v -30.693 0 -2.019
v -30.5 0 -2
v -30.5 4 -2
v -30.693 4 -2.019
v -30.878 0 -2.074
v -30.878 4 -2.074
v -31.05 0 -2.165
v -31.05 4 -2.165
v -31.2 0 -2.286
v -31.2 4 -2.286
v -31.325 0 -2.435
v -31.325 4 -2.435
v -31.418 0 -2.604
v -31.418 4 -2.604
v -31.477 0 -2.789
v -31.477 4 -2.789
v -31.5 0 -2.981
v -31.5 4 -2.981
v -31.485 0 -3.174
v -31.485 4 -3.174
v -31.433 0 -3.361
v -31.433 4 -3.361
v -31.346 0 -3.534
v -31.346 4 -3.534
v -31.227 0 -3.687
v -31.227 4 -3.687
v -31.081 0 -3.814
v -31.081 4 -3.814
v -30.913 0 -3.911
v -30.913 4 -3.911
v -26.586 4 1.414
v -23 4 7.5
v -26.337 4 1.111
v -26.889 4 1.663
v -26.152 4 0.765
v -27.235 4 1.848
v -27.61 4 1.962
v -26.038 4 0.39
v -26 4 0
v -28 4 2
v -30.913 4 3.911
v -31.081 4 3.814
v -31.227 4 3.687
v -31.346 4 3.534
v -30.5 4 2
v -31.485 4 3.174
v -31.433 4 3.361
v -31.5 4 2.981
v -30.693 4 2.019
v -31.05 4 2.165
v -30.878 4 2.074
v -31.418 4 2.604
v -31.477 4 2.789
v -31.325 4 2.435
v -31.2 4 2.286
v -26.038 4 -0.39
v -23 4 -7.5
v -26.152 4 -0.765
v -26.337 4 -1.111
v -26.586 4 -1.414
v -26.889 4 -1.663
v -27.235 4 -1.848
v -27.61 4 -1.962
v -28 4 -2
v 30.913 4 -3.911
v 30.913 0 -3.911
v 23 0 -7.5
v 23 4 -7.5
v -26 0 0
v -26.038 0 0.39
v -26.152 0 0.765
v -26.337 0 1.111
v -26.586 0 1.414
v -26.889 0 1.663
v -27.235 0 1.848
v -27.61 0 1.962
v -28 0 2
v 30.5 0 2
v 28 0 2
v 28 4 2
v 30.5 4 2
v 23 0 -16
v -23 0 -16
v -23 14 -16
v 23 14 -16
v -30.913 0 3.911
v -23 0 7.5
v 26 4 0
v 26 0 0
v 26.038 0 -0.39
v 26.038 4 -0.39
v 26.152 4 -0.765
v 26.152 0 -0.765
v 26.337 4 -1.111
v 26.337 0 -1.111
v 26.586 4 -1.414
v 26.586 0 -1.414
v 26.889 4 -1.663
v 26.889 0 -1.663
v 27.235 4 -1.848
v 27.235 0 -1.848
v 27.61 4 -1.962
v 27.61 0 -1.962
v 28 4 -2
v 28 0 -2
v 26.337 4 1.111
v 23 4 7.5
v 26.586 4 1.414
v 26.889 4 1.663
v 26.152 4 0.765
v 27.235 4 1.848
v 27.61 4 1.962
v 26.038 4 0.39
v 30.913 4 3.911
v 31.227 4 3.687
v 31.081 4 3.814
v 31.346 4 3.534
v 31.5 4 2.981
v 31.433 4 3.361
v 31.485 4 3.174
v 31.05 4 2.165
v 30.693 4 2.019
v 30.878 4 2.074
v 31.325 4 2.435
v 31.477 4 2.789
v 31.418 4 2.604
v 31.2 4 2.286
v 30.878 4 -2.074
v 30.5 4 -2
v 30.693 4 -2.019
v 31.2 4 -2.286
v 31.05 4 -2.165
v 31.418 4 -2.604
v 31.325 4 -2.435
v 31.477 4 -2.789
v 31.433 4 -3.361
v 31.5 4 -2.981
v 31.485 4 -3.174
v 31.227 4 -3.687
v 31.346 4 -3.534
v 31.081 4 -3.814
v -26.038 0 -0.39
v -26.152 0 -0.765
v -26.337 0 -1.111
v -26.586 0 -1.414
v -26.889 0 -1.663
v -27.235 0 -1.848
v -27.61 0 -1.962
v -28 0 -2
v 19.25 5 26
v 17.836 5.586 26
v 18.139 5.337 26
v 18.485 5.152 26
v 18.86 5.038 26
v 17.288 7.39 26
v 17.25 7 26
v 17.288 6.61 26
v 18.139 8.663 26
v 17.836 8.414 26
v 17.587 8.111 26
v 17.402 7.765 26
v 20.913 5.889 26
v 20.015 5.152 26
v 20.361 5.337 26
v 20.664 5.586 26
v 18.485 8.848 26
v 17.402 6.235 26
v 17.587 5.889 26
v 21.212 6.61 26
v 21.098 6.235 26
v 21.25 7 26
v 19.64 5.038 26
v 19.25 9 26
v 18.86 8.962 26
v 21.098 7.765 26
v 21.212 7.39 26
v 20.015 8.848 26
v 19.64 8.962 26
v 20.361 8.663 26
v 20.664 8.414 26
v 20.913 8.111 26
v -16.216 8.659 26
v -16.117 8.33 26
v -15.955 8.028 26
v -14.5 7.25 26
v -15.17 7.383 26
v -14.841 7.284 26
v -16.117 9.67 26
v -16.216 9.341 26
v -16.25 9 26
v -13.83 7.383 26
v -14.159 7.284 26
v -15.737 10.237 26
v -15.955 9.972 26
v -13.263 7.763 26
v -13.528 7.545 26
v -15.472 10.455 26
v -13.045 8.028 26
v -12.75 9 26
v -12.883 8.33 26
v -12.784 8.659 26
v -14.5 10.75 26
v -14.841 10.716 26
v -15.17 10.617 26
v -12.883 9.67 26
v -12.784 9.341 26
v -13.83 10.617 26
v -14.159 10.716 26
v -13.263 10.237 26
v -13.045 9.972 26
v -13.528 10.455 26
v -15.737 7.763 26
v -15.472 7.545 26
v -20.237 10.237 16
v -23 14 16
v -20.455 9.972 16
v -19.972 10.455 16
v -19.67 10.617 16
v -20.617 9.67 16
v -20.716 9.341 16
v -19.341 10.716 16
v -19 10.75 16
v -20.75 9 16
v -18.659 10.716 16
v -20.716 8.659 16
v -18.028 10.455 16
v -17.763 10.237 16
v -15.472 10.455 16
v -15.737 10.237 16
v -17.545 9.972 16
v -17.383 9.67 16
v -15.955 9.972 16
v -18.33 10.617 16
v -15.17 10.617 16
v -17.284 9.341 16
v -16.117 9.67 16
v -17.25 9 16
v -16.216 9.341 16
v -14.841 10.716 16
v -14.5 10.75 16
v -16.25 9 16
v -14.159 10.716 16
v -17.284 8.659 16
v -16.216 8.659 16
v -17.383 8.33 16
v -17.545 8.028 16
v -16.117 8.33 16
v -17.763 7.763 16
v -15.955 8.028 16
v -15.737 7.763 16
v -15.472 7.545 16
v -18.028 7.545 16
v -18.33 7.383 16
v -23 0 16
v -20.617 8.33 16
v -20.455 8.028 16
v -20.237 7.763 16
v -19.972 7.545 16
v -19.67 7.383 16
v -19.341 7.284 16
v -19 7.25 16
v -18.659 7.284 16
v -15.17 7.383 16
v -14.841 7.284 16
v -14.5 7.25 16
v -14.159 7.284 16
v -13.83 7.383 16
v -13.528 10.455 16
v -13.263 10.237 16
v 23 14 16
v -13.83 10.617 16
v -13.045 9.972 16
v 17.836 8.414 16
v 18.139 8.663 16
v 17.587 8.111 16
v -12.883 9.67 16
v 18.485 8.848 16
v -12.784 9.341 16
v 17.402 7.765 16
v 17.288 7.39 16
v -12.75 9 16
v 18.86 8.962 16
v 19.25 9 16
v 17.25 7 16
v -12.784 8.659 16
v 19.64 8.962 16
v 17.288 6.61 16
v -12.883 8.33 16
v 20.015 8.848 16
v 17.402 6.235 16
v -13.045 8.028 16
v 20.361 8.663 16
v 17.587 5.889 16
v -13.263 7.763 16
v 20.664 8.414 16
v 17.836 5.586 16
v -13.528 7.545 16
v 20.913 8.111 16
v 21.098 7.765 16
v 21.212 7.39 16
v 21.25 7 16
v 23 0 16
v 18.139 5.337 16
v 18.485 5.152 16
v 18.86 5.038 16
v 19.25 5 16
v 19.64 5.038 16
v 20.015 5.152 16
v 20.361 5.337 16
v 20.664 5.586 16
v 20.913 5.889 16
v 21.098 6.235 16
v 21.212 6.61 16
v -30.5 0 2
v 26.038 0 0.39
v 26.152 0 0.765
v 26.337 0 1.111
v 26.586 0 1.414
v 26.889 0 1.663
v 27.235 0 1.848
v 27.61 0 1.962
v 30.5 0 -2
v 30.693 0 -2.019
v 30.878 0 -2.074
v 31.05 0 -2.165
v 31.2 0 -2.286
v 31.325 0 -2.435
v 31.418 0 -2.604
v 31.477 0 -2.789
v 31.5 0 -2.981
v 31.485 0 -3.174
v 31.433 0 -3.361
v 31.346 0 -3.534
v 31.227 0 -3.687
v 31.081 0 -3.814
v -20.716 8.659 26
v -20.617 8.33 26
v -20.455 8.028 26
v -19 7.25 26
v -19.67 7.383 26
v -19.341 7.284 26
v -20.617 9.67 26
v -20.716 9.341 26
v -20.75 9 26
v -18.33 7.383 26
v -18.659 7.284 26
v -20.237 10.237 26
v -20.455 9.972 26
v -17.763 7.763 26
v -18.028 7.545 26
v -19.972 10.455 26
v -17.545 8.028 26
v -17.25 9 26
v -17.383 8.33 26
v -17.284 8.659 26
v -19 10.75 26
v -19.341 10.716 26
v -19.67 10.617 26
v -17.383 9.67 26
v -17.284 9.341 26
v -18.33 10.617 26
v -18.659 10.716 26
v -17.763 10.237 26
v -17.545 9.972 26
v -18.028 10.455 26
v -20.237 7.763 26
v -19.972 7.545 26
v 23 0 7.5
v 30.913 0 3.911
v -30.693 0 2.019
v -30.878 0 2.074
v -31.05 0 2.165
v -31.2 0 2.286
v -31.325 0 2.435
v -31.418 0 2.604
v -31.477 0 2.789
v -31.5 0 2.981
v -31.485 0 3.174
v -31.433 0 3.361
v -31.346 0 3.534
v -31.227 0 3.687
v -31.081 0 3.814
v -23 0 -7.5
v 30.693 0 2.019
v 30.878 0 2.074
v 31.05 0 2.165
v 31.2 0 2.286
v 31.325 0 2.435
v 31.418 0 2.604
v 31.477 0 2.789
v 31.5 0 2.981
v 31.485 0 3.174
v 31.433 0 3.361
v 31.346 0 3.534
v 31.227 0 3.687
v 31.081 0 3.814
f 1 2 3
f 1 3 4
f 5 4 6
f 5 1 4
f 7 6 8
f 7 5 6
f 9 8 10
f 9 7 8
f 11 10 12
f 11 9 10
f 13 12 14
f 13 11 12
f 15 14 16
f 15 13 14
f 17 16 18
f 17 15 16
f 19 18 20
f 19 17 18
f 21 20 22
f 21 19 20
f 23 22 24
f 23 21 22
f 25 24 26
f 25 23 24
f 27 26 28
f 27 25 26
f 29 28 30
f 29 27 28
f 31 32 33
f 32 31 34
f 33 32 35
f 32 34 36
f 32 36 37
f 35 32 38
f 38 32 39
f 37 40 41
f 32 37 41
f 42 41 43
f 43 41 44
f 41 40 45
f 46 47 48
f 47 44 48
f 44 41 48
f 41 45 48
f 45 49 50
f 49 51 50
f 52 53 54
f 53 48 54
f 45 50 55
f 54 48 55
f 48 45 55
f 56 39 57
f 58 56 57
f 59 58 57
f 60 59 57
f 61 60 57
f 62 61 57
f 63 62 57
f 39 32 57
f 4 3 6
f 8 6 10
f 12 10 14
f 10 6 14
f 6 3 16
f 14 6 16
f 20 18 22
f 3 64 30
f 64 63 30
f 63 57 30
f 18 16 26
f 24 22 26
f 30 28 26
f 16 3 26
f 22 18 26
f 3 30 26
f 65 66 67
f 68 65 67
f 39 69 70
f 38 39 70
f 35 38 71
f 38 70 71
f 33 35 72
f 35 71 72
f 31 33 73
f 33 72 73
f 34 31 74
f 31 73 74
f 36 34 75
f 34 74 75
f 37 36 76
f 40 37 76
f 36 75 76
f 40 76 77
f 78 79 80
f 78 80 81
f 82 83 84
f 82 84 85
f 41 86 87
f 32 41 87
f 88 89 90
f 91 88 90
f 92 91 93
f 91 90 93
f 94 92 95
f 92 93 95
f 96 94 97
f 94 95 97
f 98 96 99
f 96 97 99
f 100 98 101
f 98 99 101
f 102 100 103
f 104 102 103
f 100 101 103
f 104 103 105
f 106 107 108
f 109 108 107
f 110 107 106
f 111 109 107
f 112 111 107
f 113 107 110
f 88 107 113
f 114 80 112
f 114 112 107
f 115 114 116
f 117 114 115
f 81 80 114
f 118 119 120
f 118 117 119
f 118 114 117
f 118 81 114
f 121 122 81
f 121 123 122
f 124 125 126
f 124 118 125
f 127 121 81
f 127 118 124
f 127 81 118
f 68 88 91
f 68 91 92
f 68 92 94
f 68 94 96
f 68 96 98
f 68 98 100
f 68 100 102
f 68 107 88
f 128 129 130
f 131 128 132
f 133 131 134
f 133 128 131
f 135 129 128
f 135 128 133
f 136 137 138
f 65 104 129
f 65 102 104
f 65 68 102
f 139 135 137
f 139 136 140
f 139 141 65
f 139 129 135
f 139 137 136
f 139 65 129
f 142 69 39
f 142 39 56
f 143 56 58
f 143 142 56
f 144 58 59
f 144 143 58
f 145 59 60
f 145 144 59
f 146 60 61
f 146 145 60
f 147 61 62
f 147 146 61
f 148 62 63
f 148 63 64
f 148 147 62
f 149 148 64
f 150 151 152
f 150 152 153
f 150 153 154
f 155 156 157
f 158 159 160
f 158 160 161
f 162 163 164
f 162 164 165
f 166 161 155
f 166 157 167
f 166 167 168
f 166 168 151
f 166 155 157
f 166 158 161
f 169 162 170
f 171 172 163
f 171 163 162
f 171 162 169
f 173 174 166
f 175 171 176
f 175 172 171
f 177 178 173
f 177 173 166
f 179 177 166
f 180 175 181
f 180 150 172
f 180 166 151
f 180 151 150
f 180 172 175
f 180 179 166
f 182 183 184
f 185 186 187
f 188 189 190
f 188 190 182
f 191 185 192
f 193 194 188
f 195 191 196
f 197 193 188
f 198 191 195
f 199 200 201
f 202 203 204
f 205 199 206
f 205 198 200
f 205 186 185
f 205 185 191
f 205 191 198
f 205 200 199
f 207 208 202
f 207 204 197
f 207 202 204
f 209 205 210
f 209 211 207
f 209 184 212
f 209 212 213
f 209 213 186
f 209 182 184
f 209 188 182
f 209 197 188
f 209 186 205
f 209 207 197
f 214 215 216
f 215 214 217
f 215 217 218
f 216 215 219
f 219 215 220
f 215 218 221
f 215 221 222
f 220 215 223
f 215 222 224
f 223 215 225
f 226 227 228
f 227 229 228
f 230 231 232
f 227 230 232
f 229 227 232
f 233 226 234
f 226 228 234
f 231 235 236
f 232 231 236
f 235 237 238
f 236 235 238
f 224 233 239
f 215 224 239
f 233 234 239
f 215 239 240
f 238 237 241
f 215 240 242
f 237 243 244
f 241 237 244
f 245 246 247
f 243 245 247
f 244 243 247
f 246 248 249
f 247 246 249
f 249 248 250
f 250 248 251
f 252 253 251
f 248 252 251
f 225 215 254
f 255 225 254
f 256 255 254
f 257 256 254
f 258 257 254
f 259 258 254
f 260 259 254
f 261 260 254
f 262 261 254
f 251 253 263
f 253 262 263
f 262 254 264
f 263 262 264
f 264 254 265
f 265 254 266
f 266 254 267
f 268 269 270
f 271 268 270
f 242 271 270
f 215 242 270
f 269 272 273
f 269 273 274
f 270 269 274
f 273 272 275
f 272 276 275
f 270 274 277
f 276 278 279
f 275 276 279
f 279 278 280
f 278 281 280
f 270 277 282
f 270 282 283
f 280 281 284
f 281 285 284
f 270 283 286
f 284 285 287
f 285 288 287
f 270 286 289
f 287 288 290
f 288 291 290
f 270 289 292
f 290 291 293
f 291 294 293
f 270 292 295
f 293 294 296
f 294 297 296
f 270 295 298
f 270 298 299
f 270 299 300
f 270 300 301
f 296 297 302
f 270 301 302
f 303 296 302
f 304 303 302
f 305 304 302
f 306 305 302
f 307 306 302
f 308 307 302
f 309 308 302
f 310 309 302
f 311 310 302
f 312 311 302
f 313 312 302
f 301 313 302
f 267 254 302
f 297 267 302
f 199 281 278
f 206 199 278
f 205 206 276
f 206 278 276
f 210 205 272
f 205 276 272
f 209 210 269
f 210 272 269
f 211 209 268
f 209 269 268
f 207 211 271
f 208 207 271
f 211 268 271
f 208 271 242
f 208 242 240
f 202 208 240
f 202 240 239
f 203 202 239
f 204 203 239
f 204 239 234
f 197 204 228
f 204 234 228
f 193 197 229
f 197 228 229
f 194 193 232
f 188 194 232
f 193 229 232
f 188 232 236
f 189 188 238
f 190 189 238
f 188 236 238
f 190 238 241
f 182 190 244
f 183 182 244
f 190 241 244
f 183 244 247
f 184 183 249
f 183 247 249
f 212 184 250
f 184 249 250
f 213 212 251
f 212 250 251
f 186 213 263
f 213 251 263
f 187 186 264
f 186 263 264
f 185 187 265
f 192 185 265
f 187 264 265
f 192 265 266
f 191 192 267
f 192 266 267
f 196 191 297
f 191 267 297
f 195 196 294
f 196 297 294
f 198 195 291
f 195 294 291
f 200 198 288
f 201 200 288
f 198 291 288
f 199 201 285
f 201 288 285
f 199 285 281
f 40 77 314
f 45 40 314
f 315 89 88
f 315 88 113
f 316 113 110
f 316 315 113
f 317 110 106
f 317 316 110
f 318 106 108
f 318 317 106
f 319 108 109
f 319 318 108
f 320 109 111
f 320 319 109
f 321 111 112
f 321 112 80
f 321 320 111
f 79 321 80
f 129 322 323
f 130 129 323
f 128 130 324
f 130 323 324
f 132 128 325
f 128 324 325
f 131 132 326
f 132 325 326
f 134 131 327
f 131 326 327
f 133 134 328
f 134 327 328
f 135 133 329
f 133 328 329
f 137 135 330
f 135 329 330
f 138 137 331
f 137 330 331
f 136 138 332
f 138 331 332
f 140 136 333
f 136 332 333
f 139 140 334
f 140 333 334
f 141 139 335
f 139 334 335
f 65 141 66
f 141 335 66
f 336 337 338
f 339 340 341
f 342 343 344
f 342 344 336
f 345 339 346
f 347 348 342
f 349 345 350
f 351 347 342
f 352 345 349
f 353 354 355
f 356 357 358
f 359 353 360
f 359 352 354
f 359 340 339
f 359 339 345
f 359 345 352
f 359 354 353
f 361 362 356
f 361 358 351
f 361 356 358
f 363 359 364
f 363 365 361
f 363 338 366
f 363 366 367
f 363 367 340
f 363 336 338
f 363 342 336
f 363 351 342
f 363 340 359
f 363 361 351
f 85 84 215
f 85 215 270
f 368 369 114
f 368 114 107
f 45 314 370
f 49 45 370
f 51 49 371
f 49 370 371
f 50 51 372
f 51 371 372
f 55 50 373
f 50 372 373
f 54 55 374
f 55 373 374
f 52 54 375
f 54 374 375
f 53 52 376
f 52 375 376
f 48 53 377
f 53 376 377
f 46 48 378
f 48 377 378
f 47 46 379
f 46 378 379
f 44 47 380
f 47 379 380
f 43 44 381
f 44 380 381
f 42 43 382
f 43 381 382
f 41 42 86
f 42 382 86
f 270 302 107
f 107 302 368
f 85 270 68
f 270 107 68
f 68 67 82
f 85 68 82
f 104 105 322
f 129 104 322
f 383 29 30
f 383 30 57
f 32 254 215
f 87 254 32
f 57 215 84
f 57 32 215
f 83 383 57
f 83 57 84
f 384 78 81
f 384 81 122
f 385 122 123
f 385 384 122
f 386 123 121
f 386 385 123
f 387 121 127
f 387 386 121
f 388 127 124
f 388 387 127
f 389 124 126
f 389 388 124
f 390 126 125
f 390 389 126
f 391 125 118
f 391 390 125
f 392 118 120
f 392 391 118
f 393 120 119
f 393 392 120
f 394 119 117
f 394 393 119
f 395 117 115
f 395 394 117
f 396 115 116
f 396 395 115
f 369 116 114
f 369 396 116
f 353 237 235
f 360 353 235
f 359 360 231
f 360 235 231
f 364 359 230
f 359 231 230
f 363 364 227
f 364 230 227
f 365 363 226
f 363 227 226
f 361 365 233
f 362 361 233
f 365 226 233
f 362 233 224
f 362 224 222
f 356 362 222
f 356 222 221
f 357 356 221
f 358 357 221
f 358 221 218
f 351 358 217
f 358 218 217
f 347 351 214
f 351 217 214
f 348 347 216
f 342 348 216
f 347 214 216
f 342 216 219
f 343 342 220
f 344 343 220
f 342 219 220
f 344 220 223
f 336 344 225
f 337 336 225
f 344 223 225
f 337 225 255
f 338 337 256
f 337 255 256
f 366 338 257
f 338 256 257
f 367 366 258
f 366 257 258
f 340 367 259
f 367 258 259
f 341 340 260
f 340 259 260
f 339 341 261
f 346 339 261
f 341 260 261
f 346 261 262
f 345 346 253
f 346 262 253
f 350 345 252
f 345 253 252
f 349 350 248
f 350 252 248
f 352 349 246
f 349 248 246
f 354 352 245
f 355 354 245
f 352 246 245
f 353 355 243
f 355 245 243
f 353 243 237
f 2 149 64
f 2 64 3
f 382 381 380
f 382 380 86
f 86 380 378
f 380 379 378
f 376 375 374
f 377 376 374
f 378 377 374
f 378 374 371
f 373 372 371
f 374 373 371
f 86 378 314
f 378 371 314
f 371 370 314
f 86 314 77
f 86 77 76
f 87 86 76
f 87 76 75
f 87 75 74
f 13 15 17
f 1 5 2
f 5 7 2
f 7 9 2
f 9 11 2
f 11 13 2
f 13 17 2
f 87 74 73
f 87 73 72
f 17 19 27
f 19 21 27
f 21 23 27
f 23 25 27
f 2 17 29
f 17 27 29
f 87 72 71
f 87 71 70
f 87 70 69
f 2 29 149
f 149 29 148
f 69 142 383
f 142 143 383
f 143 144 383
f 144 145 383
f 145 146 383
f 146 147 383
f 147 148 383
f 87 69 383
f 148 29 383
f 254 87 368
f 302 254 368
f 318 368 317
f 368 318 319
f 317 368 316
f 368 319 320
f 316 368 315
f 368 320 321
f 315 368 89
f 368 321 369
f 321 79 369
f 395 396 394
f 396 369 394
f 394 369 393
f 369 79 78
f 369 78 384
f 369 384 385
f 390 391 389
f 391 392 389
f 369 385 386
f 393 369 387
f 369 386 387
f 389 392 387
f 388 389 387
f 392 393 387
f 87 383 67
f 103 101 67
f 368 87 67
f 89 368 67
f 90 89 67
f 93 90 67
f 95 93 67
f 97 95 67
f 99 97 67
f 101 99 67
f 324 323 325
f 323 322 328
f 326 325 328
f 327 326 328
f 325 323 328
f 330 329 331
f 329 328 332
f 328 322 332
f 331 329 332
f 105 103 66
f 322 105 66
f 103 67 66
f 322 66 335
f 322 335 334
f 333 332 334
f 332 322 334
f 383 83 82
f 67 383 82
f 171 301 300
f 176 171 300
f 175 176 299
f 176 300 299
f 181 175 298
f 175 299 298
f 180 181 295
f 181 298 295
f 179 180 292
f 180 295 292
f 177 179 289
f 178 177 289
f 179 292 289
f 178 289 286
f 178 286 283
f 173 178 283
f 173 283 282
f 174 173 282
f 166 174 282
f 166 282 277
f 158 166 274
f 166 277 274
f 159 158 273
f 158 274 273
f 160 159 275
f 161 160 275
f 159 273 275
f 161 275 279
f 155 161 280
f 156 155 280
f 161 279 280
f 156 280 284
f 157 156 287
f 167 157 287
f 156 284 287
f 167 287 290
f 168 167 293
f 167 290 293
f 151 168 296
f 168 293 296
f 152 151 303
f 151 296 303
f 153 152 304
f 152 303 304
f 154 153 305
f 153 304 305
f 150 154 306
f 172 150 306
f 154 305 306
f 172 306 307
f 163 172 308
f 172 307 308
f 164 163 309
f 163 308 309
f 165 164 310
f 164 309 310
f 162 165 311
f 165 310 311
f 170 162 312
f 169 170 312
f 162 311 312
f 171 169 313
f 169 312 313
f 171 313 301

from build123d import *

# Parameters (mm, degrees)
SKETCH1_W            = 46
SKETCH1_H            = 32
BOSS_EXTRUDE1_DEPTH  = 14
BOSS_EXTRUDE2_DEPTH  = 4
MIRROR2_COPY_1_DEPTH = 4
SKETCH3_R            = 1.75
SKETCH3_R_2          = 2
BOSS_EXTRUDE3_DEPTH  = 10


with BuildPart() as part:
    # Sketch1 → Boss-Extrude1 (new body)
    with BuildSketch(Plane(origin=(0, 0, 0), x_dir=(1, 0, 0), z_dir=(0, 1, 0))):
        Rectangle(SKETCH1_W, SKETCH1_H)
    extrude(amount=BOSS_EXTRUDE1_DEPTH)

    # Sketch2 → Boss-Extrude2 (add)
    with BuildSketch(Plane.XZ):
        with BuildLine():
            Line((-28, 2), (-30.5, 2))
            ThreePointArc((-30.5, 2), (-31.477418408, 2.788686832), (-30.913082761, 3.91069349))
            Line((-30.913082761, 3.91069349), (-23, 7.5))
            Line((-23, 7.5), (-23, 0))
            Line((-23, 0), (-26, 0))
            ThreePointArc((-26, 0), (-26.585786438, 1.414213562), (-28, 2))
        make_face()
    boss_extrude2 = extrude(amount=-BOSS_EXTRUDE2_DEPTH)

    # Mirror1: Boss-Extrude2 across plane
    add(boss_extrude2.mirror(Plane.XY))

    # Mirror2: Boss-Extrude2 across plane
    add(boss_extrude2.mirror(Plane(origin=(0, 0, 0), x_dir=(0, 0, 1), z_dir=(1, 0, 0))))

    # Mirror2 copy 1 sketch → Mirror2 copy 1 (add)
    with BuildSketch(Plane(origin=(0, 0, 0), x_dir=(-1, 0, 0), z_dir=(0, -1, 0))):
        with BuildLine():
            Line((-28, 2), (-30.5, 2))
            ThreePointArc((-30.5, 2), (-31.477418408, 2.788686832), (-30.913082761, 3.91069349))
            Line((-30.913082761, 3.91069349), (-23, 7.5))
            Line((-23, 7.5), (-23, 0))
            Line((-23, 0), (-26, 0))
            ThreePointArc((-26, 0), (-26.585786438, 1.414213562), (-28, 2))
        make_face()
    extrude(amount=-MIRROR2_COPY_1_DEPTH)

    # Sketch3 → Boss-Extrude3 (add)
    with BuildSketch(Plane.XY.offset(16)):
        with Locations((-19, 9)):
            Circle(SKETCH3_R)
        with Locations((-14.5, 9)):
            Circle(SKETCH3_R)
        with Locations((19.25, 7)):
            Circle(SKETCH3_R_2)
    extrude(amount=BOSS_EXTRUDE3_DEPTH)


solid = part.part
